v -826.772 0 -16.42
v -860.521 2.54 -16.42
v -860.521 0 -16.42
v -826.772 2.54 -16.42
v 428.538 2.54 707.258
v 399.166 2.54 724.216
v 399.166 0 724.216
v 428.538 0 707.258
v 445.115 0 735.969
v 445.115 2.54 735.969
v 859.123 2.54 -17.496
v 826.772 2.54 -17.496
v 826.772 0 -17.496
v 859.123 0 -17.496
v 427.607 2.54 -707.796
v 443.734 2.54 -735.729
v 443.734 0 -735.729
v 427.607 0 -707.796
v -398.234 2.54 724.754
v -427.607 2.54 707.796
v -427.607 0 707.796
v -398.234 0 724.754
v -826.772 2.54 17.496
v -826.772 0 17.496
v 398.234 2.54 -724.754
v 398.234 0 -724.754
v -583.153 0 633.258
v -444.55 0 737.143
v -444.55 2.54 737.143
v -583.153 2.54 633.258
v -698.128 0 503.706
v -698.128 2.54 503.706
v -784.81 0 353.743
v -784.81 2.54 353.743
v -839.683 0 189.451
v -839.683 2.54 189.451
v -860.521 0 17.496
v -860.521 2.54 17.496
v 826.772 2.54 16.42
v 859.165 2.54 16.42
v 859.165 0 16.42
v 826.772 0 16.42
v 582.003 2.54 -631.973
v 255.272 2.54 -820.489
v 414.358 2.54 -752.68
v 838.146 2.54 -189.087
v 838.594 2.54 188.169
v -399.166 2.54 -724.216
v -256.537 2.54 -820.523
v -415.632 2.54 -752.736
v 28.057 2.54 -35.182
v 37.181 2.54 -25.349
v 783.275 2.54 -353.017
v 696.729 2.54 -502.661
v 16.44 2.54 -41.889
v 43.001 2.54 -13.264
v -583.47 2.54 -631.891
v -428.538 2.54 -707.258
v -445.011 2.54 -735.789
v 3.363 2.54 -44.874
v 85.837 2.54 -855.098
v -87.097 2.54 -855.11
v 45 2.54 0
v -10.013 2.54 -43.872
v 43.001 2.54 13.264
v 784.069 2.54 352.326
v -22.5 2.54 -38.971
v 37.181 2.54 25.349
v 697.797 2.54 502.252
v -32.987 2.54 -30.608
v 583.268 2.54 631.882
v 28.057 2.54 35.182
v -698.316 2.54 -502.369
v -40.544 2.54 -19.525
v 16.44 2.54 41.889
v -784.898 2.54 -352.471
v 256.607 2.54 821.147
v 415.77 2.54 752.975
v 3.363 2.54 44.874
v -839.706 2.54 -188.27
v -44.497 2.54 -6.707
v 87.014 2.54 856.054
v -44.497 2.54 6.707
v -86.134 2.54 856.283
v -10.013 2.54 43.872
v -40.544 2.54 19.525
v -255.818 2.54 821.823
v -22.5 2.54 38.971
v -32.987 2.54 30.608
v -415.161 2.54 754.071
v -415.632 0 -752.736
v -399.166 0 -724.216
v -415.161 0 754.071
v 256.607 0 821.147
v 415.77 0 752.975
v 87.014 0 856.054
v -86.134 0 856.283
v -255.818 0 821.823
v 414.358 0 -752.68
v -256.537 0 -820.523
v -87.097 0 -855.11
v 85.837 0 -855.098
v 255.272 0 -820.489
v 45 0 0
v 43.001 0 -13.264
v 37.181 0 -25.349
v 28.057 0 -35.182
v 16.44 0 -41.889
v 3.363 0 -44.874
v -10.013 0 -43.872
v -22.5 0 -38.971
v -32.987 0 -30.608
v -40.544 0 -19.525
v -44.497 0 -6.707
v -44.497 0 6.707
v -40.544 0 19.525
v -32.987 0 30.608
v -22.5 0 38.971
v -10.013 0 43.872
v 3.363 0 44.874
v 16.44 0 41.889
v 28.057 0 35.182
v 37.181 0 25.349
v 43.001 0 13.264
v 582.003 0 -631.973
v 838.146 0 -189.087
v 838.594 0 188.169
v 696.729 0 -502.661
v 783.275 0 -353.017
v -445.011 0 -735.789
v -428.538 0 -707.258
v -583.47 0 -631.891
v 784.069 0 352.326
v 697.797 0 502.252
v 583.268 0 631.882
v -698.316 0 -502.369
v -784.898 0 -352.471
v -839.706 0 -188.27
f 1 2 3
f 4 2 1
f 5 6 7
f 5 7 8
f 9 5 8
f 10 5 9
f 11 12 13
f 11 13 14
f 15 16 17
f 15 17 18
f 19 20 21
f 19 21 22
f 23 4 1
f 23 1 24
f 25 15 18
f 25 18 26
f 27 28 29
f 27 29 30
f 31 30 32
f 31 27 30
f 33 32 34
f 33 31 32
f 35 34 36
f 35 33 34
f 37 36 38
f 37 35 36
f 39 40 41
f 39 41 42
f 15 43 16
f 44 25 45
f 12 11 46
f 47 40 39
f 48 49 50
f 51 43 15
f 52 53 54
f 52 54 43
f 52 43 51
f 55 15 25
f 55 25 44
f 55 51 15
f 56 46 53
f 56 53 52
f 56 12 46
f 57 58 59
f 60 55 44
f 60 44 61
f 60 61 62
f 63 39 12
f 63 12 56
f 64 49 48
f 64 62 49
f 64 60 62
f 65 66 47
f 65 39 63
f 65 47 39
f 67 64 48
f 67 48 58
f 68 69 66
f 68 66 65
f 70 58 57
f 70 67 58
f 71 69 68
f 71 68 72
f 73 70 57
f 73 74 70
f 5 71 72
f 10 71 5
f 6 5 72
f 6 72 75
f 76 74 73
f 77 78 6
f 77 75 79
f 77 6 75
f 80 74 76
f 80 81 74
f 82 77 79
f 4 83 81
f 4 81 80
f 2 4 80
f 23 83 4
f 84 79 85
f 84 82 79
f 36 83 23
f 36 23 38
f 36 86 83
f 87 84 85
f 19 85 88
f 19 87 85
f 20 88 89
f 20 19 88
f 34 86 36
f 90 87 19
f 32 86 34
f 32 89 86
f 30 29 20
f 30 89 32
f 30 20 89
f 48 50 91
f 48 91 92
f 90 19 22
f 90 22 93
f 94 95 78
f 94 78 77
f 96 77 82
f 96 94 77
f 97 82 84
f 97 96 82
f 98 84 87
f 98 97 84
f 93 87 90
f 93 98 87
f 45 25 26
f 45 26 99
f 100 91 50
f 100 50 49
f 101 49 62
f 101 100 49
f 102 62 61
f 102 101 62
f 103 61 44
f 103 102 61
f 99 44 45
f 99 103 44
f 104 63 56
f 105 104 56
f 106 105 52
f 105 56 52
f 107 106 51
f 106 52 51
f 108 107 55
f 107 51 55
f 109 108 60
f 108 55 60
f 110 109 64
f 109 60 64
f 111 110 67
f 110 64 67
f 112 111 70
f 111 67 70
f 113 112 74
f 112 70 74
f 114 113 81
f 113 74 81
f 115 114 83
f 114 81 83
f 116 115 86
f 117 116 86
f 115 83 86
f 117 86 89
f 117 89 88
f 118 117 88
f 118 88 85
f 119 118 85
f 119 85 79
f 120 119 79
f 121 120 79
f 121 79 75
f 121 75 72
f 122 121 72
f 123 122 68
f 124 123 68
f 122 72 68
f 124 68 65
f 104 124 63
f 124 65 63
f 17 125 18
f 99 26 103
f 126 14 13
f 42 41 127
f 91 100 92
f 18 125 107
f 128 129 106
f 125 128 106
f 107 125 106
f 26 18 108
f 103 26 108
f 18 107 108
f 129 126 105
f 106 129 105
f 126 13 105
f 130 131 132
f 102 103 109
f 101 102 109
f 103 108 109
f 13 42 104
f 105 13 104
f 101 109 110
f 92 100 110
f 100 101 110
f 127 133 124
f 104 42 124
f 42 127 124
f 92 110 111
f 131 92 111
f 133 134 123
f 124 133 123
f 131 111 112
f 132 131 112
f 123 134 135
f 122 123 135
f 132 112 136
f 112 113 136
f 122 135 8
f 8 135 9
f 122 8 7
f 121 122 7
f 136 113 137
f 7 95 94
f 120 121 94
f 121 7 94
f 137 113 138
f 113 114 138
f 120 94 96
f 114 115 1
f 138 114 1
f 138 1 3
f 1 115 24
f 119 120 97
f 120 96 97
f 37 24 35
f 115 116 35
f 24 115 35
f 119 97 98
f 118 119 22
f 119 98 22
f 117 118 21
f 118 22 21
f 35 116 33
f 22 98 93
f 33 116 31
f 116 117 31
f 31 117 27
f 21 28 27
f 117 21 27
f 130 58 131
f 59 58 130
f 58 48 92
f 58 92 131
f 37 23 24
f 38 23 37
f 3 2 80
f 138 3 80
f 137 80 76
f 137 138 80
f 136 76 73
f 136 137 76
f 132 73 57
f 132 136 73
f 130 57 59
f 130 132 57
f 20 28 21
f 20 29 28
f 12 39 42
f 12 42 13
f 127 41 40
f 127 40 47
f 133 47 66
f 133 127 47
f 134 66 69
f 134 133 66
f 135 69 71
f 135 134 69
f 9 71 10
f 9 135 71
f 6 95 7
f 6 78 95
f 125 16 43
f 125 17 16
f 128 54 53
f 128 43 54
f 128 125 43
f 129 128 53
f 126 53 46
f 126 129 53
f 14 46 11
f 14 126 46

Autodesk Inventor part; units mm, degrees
ref_plane "YZ Plane" through (0, 0, 0) normal (1, 0, 0) x (0, 1, 0)
ref_plane "XZ Plane" through (0, 0, 0) normal (0, 1, 0) x (-1, 0, 0)
ref_plane "XY Plane" through (0, 0, 0) normal (0, 0, 1) x (1, 0, 0)
sketch "Sketch1" plane through (0, 0, 0) normal (0, 1, 0) x (-1, 0, 0)
  circle A0 centre (0.6883, 0.5378) radius 860
  point P0 (0, 0)
  dimension "d0" = 1720
extrude "Extrusion1" add sketch "Sketch1" along normal blind 2.54
sketch "Sketch2" plane through (-0.6883, 2.54, 0.5378) normal (0, 1, 0) x (1, 0, 0)
  circle A0 centre (0.6883, 0.5378) radius 45
  dimension "d7" = 90
extrude "Extrusion2" cut sketch "Sketch2" against normal blind 25.4
sketch "Sketch3" plane through (-0.6883, 2.54, 0.5378) normal (0, 1, 0) x (1, 0, 0)
  circle A0 centre (0, 0) radius 860 projected
  line L0 (-893.9159, 16.958) -> (-826.0841, 16.958)
  line L1 (-826.0841, 16.958) -> (-826.0841, -16.958)
  line L2 (-826.0841, -16.958) -> (-893.9159, -16.958)
  line L3 (-893.9159, -16.958) -> (-893.9159, 16.958)
  line L4 (-860, 16.958) -> (-860, -16.958) construction
  line L5 (0, 0) -> (-860, 0) construction
extrude "Extrusion3" cut sketch "Sketch3" against normal blind 10 contours L0 L1 L2 A0 | A0 L2 L3 L0 picked at (-837.3832, 1.8843)
pattern_circular "Circular Pattern1" count 6 over 360 about axis through (0, 2.54, 0) along (0, -1, 0) of "Extrusion3"
properties part number "2f2surf" material "Glass"
